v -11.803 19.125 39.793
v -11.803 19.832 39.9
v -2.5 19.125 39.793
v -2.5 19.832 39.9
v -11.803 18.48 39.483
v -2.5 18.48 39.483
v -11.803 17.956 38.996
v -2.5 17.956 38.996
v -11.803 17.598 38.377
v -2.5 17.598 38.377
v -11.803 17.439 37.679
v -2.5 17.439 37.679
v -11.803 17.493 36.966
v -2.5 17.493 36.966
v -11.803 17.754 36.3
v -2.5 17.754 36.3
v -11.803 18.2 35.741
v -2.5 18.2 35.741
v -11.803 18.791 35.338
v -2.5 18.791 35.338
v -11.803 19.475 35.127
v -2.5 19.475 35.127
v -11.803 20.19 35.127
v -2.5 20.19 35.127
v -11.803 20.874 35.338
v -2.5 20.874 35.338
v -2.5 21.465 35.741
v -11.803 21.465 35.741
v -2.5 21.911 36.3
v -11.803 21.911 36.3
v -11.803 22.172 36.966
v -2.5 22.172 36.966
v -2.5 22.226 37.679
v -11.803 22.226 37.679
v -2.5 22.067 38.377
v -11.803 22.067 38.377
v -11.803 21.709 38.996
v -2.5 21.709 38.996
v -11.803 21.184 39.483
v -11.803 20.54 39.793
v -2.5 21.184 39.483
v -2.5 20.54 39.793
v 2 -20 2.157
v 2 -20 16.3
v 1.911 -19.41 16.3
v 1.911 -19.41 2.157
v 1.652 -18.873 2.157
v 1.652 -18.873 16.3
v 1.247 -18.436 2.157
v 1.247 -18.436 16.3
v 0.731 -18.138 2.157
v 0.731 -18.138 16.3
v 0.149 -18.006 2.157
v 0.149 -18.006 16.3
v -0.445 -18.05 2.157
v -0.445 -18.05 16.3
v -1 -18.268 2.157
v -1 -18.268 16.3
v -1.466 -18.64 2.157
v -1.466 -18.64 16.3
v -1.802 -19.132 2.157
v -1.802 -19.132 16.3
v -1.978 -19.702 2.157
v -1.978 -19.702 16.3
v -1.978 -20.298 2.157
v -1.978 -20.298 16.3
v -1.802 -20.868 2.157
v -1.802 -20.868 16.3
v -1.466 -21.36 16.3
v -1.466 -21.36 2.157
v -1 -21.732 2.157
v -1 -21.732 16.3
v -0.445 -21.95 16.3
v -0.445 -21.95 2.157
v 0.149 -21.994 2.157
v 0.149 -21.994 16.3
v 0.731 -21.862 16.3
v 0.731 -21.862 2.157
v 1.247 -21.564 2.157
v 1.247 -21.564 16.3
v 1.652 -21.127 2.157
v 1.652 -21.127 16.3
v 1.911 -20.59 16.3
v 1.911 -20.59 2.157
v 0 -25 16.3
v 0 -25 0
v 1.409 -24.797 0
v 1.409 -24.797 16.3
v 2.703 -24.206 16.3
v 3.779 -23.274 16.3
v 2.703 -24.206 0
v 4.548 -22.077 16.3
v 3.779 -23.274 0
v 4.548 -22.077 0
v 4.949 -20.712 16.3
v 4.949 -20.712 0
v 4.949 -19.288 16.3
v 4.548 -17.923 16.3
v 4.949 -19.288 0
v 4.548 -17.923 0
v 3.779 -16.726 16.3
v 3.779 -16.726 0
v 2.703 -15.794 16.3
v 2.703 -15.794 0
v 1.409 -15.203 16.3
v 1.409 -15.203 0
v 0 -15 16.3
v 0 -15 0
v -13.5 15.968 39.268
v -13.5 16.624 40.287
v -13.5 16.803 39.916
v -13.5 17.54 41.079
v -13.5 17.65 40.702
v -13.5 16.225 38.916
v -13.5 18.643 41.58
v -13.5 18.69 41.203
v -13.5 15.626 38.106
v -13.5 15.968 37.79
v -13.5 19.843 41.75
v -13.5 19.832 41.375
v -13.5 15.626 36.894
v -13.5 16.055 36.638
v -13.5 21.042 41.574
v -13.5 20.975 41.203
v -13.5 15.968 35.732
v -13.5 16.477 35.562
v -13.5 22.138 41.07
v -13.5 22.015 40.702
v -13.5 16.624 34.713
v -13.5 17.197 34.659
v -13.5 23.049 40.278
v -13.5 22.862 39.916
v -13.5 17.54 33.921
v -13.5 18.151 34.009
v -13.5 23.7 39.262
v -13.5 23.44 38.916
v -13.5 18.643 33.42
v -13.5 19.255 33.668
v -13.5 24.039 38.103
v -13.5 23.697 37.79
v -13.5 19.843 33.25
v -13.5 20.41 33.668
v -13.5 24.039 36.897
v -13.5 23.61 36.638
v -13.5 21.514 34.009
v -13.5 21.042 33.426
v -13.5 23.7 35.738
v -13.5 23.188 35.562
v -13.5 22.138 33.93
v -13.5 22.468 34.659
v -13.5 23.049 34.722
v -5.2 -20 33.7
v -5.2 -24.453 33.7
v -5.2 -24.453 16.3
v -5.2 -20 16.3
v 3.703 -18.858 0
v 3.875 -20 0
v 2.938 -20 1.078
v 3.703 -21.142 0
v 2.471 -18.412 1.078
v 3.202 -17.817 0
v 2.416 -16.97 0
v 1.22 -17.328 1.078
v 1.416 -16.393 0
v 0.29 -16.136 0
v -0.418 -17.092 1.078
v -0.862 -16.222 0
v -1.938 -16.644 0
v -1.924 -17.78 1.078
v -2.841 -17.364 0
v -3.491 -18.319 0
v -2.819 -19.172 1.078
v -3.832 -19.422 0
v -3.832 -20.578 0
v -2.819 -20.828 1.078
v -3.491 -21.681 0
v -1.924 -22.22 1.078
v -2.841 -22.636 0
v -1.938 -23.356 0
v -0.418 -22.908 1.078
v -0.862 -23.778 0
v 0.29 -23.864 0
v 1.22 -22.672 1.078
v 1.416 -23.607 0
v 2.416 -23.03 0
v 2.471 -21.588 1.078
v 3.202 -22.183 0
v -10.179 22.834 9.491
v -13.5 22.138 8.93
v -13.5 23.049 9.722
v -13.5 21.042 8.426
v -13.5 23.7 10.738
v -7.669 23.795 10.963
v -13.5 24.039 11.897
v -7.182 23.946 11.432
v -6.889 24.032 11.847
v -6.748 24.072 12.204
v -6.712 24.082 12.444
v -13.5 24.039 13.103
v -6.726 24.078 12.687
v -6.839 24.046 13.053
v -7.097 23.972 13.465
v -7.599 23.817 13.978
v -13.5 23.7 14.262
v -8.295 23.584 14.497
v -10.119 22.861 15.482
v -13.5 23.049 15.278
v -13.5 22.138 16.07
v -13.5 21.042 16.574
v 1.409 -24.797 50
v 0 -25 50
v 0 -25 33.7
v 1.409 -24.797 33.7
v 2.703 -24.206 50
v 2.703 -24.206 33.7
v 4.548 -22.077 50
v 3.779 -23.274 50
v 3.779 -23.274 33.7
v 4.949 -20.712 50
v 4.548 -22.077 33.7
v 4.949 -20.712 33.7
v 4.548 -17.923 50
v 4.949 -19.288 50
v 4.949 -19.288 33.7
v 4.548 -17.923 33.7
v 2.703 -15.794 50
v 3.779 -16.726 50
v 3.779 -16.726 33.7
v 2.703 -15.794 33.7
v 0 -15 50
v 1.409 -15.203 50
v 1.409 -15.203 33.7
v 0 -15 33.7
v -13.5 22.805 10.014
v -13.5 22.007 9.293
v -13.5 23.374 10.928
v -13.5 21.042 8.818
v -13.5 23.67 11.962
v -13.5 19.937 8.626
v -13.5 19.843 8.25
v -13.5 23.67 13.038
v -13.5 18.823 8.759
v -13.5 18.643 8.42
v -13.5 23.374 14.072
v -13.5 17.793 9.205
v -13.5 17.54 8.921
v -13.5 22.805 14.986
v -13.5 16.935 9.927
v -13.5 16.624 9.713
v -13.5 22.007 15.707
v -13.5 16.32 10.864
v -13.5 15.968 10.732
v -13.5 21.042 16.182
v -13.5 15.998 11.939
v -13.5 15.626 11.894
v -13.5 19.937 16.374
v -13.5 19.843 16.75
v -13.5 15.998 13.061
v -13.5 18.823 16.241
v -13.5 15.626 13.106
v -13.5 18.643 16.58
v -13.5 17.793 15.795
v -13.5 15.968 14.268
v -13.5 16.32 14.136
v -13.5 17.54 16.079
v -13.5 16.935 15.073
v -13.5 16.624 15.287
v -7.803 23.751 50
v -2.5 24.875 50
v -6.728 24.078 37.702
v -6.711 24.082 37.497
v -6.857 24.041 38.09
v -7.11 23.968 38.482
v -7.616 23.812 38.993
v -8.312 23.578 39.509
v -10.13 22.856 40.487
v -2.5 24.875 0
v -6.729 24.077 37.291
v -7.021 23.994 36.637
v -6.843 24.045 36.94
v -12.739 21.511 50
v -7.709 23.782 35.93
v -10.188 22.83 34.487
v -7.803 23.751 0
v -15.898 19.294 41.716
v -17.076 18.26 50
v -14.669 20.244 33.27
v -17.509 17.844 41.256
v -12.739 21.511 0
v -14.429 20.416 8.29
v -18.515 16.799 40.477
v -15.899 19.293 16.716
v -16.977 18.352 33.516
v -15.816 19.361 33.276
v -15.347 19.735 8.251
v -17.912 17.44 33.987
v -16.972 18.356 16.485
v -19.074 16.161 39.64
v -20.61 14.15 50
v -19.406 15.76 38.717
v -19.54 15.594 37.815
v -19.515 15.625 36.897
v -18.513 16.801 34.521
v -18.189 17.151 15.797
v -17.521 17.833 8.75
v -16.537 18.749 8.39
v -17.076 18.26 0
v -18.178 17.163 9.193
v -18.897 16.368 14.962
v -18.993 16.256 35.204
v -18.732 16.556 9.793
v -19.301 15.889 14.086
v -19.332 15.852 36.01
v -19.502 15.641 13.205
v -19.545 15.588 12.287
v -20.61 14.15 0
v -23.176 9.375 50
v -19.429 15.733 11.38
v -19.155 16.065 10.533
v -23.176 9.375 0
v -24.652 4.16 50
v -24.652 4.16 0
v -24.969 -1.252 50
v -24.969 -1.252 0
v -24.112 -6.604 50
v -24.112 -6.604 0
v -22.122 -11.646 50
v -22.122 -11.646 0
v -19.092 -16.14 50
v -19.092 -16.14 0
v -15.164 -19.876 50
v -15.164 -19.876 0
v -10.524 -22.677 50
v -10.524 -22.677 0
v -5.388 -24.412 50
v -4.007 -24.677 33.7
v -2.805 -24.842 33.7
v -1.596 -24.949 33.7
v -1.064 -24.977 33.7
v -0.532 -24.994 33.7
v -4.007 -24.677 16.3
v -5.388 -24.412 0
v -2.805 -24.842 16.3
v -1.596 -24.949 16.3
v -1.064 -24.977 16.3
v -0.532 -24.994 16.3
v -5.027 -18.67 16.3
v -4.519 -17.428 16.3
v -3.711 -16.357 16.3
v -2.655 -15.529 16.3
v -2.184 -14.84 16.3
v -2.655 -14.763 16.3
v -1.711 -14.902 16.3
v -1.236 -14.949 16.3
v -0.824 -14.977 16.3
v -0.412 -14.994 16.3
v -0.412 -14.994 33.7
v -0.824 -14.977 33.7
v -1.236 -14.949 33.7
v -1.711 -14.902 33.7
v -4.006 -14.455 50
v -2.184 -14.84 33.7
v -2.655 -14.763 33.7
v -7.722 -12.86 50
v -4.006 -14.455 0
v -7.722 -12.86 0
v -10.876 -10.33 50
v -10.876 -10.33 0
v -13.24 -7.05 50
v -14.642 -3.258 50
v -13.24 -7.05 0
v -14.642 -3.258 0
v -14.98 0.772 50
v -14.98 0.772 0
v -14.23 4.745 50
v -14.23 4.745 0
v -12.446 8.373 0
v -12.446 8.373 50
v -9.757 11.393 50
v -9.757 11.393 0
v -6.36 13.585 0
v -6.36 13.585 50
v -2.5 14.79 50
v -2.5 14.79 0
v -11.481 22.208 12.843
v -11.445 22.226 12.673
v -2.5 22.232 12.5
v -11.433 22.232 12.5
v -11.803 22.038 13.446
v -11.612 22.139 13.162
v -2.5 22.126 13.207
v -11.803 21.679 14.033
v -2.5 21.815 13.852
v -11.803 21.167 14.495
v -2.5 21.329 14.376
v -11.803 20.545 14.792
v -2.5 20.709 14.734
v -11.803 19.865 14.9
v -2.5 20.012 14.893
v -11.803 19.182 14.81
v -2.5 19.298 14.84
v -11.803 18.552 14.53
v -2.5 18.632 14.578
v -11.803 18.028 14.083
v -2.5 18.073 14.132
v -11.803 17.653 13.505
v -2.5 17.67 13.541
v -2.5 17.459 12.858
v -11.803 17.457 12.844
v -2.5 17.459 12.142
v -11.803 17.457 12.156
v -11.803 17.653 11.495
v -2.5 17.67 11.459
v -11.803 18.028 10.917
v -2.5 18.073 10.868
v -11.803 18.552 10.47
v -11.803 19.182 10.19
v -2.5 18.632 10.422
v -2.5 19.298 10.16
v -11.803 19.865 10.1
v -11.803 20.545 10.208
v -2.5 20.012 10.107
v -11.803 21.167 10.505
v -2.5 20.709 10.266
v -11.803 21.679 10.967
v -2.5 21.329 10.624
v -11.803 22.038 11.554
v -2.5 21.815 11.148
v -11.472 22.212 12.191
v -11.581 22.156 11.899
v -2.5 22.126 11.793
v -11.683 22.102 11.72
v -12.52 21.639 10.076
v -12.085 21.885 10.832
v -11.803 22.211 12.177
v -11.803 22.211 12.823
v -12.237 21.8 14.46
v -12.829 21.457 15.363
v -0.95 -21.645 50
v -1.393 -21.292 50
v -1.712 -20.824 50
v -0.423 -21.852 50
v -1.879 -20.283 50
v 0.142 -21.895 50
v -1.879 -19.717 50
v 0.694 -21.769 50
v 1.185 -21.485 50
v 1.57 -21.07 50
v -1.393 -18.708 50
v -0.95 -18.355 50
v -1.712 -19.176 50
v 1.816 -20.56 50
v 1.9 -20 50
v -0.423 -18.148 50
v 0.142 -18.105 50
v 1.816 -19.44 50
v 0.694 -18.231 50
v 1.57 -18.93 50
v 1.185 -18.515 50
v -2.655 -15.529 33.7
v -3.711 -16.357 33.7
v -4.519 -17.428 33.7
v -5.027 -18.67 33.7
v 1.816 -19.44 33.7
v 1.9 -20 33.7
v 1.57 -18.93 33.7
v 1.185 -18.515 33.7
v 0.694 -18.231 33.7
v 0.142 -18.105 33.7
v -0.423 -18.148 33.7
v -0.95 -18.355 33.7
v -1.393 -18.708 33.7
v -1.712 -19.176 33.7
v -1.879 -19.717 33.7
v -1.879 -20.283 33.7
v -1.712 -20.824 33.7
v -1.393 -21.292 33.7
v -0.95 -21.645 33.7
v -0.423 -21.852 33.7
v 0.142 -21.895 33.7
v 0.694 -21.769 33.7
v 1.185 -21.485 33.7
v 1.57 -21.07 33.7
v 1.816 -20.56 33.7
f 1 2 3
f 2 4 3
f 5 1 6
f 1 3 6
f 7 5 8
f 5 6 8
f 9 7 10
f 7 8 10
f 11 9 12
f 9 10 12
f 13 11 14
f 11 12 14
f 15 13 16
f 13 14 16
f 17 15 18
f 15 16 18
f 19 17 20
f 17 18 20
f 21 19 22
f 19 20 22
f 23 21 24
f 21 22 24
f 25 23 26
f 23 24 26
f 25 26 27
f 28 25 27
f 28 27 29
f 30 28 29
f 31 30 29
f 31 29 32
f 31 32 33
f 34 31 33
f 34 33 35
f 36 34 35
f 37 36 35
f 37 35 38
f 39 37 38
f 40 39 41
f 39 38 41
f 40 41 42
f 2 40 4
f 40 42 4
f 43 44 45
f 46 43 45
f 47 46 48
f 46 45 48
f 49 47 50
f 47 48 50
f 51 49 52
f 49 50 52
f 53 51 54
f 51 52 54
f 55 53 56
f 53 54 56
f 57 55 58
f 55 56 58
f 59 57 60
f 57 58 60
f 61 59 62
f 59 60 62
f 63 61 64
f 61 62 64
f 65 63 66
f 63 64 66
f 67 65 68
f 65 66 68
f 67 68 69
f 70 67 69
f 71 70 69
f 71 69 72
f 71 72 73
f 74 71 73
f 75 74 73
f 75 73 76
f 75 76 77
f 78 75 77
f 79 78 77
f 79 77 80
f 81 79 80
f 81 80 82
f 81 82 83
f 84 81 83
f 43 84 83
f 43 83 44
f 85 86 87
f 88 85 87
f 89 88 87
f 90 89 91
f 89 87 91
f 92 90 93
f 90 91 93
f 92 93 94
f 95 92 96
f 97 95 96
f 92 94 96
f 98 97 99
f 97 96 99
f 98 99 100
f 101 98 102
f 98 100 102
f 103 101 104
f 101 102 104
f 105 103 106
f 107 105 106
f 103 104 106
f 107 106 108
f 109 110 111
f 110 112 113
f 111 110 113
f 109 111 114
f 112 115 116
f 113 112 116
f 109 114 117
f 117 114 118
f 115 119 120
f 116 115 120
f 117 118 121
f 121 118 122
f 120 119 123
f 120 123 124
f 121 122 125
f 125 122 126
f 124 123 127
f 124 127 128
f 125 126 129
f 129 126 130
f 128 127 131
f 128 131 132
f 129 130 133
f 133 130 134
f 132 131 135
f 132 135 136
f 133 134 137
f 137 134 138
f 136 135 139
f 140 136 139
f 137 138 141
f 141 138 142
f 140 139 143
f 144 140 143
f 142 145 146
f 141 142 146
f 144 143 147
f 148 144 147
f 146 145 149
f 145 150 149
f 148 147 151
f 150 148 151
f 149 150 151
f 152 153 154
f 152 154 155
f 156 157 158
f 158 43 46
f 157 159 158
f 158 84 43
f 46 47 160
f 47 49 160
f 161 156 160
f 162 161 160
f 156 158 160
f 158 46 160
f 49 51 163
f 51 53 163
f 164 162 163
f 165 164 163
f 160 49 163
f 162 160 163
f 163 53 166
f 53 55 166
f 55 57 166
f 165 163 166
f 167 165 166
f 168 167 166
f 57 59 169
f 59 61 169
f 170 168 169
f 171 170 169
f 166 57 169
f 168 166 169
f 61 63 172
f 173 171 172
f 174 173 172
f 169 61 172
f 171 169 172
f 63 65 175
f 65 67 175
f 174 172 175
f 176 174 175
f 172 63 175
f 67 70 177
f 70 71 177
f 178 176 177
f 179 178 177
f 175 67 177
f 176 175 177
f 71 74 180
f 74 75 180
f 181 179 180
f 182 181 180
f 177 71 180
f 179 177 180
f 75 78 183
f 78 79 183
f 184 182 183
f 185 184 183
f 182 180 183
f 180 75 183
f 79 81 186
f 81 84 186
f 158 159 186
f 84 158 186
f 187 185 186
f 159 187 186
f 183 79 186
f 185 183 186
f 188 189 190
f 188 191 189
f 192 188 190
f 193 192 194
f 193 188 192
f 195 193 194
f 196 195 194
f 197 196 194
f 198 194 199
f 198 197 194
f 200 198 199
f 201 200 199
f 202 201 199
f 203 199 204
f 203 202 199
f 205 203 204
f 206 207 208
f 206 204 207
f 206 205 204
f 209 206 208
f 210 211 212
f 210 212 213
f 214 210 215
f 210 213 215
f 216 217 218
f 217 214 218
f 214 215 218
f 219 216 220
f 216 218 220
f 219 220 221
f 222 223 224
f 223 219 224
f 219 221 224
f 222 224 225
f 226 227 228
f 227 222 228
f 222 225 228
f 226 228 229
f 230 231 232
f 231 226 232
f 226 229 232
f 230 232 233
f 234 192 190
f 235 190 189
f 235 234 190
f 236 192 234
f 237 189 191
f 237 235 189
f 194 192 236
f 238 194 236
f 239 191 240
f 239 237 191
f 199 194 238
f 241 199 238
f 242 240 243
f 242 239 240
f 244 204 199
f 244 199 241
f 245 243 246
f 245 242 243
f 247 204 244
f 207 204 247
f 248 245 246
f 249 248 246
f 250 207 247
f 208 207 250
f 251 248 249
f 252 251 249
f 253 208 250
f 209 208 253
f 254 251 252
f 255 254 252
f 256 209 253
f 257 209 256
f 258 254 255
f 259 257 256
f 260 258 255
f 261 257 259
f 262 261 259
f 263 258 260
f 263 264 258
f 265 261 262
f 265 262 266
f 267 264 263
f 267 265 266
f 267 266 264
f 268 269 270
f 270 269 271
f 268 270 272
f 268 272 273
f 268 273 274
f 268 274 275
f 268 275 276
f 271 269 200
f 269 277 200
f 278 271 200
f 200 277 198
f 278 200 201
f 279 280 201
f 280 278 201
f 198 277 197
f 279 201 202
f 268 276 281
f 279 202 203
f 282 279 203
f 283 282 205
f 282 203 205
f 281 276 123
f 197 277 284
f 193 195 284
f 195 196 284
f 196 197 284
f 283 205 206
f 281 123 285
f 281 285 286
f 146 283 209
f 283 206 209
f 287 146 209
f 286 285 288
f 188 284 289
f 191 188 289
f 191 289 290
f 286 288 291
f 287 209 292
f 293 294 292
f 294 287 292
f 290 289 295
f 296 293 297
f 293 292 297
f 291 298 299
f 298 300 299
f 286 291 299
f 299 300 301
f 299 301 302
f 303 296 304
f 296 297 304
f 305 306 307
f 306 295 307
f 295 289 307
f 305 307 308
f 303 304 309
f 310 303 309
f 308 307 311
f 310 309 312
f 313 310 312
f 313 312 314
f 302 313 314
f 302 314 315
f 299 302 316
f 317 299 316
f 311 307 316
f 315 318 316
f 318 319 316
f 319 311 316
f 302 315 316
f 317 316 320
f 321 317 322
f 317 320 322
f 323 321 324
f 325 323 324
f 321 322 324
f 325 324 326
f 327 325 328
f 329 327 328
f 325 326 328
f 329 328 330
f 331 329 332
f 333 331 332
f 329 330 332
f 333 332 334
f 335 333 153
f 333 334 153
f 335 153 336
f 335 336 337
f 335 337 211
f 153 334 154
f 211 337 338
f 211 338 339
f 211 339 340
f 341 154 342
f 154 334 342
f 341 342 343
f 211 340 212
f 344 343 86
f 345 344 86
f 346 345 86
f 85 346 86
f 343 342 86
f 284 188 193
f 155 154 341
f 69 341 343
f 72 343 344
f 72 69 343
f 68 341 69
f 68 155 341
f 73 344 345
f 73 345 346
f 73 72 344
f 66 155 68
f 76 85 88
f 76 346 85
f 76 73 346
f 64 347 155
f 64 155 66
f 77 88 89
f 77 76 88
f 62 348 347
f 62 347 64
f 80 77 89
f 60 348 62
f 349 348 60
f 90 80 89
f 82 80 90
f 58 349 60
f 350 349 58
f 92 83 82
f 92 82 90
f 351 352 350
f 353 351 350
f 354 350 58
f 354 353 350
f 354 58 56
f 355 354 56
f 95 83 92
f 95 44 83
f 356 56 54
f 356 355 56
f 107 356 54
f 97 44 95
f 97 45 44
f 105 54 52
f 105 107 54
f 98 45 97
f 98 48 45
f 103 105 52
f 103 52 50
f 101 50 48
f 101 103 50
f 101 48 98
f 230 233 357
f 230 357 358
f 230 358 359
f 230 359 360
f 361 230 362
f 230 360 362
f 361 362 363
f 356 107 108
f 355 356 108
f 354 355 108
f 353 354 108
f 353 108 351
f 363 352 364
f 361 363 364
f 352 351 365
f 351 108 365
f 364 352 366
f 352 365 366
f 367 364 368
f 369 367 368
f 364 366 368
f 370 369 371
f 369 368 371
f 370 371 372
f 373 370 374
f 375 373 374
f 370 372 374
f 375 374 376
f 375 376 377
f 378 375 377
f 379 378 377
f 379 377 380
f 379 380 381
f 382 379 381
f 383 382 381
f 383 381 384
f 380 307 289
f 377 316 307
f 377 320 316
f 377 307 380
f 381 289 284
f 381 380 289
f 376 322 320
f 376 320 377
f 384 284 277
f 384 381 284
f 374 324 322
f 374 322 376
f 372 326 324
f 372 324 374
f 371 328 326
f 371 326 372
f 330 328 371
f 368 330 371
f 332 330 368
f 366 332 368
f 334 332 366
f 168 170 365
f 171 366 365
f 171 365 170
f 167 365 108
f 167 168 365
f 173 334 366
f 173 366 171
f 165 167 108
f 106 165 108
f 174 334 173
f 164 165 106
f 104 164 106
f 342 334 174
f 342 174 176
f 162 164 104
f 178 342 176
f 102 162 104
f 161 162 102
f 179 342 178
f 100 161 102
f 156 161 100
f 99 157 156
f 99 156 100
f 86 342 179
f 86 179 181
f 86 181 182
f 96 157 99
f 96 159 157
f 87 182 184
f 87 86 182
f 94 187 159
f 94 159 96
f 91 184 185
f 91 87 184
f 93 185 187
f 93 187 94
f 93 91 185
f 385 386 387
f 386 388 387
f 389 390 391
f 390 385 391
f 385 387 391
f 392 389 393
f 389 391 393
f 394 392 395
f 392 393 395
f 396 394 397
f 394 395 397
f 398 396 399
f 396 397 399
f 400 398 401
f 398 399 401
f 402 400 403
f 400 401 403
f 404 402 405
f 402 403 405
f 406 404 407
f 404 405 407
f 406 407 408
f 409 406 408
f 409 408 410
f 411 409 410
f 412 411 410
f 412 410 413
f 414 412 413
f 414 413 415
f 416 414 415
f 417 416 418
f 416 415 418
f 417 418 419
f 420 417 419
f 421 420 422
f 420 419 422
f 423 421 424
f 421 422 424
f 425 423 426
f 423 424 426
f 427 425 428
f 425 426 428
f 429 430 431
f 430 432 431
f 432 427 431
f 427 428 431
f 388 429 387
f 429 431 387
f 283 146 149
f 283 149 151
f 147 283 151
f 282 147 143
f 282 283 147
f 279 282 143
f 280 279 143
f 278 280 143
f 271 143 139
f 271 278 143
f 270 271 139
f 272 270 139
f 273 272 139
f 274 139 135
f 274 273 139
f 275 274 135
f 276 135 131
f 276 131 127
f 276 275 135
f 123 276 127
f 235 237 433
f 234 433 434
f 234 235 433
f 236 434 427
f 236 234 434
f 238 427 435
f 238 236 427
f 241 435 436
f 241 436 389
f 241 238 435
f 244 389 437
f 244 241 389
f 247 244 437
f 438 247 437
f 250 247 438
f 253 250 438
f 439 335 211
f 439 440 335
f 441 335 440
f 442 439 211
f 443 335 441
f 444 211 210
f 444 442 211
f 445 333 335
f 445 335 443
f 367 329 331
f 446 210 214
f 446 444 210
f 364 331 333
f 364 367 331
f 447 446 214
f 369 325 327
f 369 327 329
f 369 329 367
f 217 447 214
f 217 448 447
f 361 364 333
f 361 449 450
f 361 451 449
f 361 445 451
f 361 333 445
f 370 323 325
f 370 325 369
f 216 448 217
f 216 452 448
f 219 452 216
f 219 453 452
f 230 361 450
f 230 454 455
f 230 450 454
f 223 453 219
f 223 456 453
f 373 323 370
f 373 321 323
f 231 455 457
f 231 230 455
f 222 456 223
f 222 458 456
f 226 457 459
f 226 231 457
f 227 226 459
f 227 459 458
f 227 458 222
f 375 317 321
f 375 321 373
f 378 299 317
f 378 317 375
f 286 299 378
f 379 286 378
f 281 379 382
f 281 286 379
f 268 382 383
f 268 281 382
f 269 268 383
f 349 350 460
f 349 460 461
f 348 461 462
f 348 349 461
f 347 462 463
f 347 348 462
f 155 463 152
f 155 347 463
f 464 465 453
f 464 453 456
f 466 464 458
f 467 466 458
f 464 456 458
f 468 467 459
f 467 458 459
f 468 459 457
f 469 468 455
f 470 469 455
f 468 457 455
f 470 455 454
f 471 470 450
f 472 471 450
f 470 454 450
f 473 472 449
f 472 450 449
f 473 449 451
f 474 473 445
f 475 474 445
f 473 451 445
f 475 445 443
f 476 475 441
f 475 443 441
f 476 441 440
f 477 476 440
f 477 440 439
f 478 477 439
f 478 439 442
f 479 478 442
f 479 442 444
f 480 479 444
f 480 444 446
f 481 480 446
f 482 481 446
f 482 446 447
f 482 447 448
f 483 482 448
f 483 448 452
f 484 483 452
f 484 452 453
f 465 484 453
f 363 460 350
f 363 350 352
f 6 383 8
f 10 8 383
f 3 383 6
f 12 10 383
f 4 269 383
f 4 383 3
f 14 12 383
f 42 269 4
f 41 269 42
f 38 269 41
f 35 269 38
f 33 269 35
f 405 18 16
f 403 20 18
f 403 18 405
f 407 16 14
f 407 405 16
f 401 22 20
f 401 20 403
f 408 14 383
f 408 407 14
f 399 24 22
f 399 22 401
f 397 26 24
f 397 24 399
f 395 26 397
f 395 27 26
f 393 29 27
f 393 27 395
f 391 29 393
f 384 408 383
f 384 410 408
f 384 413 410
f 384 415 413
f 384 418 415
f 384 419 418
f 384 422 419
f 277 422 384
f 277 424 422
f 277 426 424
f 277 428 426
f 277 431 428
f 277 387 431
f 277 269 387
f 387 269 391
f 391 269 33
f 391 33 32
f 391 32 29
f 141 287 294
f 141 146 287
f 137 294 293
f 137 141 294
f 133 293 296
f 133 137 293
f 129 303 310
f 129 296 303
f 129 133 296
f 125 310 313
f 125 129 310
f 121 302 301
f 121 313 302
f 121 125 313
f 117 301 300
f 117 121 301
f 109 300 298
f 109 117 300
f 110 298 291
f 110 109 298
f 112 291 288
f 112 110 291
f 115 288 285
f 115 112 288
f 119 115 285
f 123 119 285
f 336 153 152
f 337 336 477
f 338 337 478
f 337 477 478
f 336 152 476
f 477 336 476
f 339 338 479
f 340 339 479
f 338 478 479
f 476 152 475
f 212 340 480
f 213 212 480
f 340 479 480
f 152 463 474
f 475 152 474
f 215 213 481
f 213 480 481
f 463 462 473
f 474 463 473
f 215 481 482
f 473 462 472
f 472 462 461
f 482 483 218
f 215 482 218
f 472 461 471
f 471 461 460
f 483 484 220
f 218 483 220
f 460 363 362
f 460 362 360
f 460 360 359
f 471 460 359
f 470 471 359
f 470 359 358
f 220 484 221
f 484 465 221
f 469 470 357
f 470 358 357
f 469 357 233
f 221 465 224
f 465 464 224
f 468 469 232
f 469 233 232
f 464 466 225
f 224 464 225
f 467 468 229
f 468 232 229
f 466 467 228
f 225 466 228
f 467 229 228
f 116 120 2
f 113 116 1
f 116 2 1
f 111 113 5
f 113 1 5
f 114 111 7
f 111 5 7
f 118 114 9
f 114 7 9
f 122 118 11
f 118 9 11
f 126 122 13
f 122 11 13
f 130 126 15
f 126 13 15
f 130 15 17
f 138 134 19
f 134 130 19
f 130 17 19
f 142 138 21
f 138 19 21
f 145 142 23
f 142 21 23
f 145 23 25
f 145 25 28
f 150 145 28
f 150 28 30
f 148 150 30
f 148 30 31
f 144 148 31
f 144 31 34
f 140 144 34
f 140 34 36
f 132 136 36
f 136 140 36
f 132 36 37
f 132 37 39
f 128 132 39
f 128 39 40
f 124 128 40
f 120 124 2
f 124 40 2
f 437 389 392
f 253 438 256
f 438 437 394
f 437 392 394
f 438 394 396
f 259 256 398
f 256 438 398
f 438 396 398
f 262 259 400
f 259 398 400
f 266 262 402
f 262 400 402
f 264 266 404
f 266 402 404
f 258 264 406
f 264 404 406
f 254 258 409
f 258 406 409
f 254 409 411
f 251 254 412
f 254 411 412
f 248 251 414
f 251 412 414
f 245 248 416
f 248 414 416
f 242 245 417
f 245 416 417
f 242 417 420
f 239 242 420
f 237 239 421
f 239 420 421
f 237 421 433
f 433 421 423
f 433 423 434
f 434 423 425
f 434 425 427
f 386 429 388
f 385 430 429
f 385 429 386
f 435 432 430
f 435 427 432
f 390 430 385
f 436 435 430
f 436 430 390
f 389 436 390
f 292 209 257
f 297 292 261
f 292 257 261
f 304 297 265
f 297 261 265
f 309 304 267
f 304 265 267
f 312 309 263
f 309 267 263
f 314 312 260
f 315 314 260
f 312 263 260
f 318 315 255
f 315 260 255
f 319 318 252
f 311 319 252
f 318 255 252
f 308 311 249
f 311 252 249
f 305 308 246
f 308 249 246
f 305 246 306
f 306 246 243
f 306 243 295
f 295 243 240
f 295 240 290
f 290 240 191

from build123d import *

# Parameters (mm, degrees)
SKETCH1_R              = 5
SKETCH1_R_2            = 3
BOSS_EXTRUDE1_DEPTH    = 50
CUT_EXTRUDE1_START     = 16.3
CUT_EXTRUDE1_OUTLINE_R = 3
CUT_EXTRUDE1_DEPTH     = 17.4
SKETCH2_W              = 5.2
SKETCH2_H              = 5
CUT_EXTRUDE2_DEPTH     = 17.4
CUT_EXTRUDE4_DEPTH     = 17.4
SKETCH3_R              = 4.25
BOSS_EXTRUDE2_DEPTH    = 11
SKETCH6_R              = 4.25
CUT_EXTRUDE5_DEPTH     = 59.883359407
HOLE1_D                = 4.8
HOLE1_CSINK_D          = 7.75
HOLE1_CSINK_ANGLE      = 82
SKETCH9_R              = 3
BOSS_EXTRUDE3_DEPTH    = 16.3
MIRROR1_START          = 33.7
MIRROR1_OUTLINE_R      = 3
MIRROR1_DEPTH          = 16.3
HOLE2_D                = 4
HOLE2_DEPTH            = 16.3
HOLE2_CSINK_D          = 7.75
HOLE2_CSINK_ANGLE      = 82
HOLE3_D                = 3.8


# Read off the part's stored shape, not the designer's step: Cut-Extrude1, Mirror1
with BuildPart() as part:
    # Sketch1 → Boss-Extrude1 (new body)
    # profile 1 of 2: a face of its own
    with BuildSketch(Plane.XY):
        with BuildLine():
            Line((-2.5, 14.790199458), (-2.5, 24.874685928))
            ThreePointArc((-2.5, 24.874685928), (-24.968651828, -1.251569376), (0, -25))
            ThreePointArc((0, -25), (-5, -20), (0, -15))
            ThreePointArc((0, -15), (-14.947457842, -1.254393904), (-2.5, 14.790199458))
        make_face()
    # profile 2 of 2: a face of its own
    with BuildSketch(Plane.XY):
        with Locations((0, -20)):
            Circle(SKETCH1_R)
        with Locations((0, -20)):
            Circle(SKETCH1_R_2, mode=Mode.SUBTRACT)
    extrude(amount=BOSS_EXTRUDE1_DEPTH)

    # Cut-Extrude1 outline → Cut-Extrude1 (cut)
    with BuildSketch(Plane.XY.offset(CUT_EXTRUDE1_START)):
        with BuildLine():
            ThreePointArc((-1.235879849, -14.949), (-5.196630355, -19.812829077), (-1.59605733, -24.949))
            ThreePointArc((-1.59605733, -24.949), (-0.798435971, -24.987246747), (0, -25))
            ThreePointArc((0, -25), (5, -20), (0, -15))
            ThreePointArc((0, -15), (-0.618465844, -14.987244577), (-1.235879849, -14.949))
        make_face()
        with Locations((0, -20)):
            Circle(CUT_EXTRUDE1_OUTLINE_R, mode=Mode.SUBTRACT)
    extrude(amount=CUT_EXTRUDE1_DEPTH, mode=Mode.SUBTRACT)

    # Sketch2 → Cut-Extrude2 (cut)
    with BuildSketch(Plane.XY.offset(16.3)):
        with Locations((-2.6, -22.5)):
            Rectangle(SKETCH2_W, SKETCH2_H)
    extrude(amount=CUT_EXTRUDE2_DEPTH, mode=Mode.SUBTRACT)

    # Sketch4 → Cut-Extrude4 (cut)
    with BuildSketch(Plane(origin=(0, 0, 33.7), x_dir=(-1, 0, 0), z_dir=(0, 0, -1))):
        with BuildLine():
            Line((2.655027114, -15.763157895), (2.655027114, -14.763157895))
            ThreePointArc((2.655027114, -14.763157895), (1.332784975, -14.940672147), (0, -15))
            ThreePointArc((0, -15), (1.381265629, -15.194575434), (2.655027114, -15.763157895))
        make_face()
    extrude(amount=CUT_EXTRUDE4_DEPTH, mode=Mode.SUBTRACT)

    # Sketch3 → Boss-Extrude2 (add)
    with BuildSketch(Plane(origin=(-2.5, 0, 0), x_dir=(0, 0, -1), z_dir=(1, 0, 0))):
        with Locations((-37.5, 19.832442693)):
            Circle(SKETCH3_R)
    extrude(amount=-BOSS_EXTRUDE2_DEPTH)

    # Sketch6 → Cut-Extrude5 (cut, through all)
    with BuildSketch(Plane.ZY.offset(13.5)):
        with Locations((37.5, 19.832442693)):
            Circle(SKETCH6_R)
    extrude(amount=CUT_EXTRUDE5_DEPTH, mode=Mode.SUBTRACT)

    # Hole1 (through all)
    with Locations(Plane(origin=(-13.5, 19.832442693, 37.5), x_dir=(0, 0, -1), z_dir=(-1, 0, 0))):
        with Locations((0, 0)):
            CounterSinkHole(HOLE1_D / 2, HOLE1_CSINK_D / 2, counter_sink_angle=HOLE1_CSINK_ANGLE)

    # Sketch9 → Boss-Extrude3 (add)
    with BuildSketch(Plane(origin=(0, 0, 0), x_dir=(-1, 0, 0), z_dir=(0, 0, -1))):
        with Locations(Location((0, -20, 0), (0, 0, 180))):
            Circle(SKETCH9_R)
    extrude(amount=-BOSS_EXTRUDE3_DEPTH)

    # Mirror1 outline → Mirror1 (add)
    with BuildSketch(Plane.XY.offset(MIRROR1_START)):
        with Locations((0, -20)):
            Circle(MIRROR1_OUTLINE_R)
    extrude(amount=MIRROR1_DEPTH)

    # Mirror1 2 outline → Mirror1 2 (revolve)
    with BuildSketch(Plane(origin=(0, 19.832442693, 12.5), x_dir=(0, 1, 0), z_dir=(0, 0, -1))):
        Polygon((2.4, -11.803206599), (3.875, -13.5), (4.25, -13.5), (4.25, -6.708985665), (2.4, -6.708985665), align=None)
    revolve(axis=Axis((0, 19.832442693, 12.5), (1, 0, 0)))

    # Mirror1 3 outline → Mirror1 3 (revolve, cut)
    with BuildSketch(Plane(origin=(0, 19.832442693, 12.5), x_dir=(0, 1, 0), z_dir=(0, 0, -1))):
        Polygon((4.25, -13.5), (3.875, -13.5), (2.4, -11.803206599), (2.4, -2.5), (0, -2.5), (0, -19.550181267), (4.25, -19.550181267), align=None)
    revolve(axis=Axis((0, 19.832442693, 12.5), (1, 0, 0)), mode=Mode.SUBTRACT)

    # Hole2
    with Locations(Plane(origin=(0, -20, 0), x_dir=(-1, 0, 0), z_dir=(0, 0, -1))):
        with Locations((0, 0)):
            CounterSinkHole(HOLE2_D / 2, HOLE2_CSINK_D / 2, depth=HOLE2_DEPTH, counter_sink_angle=HOLE2_CSINK_ANGLE)

    # Hole3 (through all)
    with Locations(Plane(origin=(0, -20, 33.7), x_dir=(-1, 0, 0), z_dir=(0, 0, -1))):
        with Locations((0, 0)):
            Hole(HOLE3_D / 2)


solid = part.part
